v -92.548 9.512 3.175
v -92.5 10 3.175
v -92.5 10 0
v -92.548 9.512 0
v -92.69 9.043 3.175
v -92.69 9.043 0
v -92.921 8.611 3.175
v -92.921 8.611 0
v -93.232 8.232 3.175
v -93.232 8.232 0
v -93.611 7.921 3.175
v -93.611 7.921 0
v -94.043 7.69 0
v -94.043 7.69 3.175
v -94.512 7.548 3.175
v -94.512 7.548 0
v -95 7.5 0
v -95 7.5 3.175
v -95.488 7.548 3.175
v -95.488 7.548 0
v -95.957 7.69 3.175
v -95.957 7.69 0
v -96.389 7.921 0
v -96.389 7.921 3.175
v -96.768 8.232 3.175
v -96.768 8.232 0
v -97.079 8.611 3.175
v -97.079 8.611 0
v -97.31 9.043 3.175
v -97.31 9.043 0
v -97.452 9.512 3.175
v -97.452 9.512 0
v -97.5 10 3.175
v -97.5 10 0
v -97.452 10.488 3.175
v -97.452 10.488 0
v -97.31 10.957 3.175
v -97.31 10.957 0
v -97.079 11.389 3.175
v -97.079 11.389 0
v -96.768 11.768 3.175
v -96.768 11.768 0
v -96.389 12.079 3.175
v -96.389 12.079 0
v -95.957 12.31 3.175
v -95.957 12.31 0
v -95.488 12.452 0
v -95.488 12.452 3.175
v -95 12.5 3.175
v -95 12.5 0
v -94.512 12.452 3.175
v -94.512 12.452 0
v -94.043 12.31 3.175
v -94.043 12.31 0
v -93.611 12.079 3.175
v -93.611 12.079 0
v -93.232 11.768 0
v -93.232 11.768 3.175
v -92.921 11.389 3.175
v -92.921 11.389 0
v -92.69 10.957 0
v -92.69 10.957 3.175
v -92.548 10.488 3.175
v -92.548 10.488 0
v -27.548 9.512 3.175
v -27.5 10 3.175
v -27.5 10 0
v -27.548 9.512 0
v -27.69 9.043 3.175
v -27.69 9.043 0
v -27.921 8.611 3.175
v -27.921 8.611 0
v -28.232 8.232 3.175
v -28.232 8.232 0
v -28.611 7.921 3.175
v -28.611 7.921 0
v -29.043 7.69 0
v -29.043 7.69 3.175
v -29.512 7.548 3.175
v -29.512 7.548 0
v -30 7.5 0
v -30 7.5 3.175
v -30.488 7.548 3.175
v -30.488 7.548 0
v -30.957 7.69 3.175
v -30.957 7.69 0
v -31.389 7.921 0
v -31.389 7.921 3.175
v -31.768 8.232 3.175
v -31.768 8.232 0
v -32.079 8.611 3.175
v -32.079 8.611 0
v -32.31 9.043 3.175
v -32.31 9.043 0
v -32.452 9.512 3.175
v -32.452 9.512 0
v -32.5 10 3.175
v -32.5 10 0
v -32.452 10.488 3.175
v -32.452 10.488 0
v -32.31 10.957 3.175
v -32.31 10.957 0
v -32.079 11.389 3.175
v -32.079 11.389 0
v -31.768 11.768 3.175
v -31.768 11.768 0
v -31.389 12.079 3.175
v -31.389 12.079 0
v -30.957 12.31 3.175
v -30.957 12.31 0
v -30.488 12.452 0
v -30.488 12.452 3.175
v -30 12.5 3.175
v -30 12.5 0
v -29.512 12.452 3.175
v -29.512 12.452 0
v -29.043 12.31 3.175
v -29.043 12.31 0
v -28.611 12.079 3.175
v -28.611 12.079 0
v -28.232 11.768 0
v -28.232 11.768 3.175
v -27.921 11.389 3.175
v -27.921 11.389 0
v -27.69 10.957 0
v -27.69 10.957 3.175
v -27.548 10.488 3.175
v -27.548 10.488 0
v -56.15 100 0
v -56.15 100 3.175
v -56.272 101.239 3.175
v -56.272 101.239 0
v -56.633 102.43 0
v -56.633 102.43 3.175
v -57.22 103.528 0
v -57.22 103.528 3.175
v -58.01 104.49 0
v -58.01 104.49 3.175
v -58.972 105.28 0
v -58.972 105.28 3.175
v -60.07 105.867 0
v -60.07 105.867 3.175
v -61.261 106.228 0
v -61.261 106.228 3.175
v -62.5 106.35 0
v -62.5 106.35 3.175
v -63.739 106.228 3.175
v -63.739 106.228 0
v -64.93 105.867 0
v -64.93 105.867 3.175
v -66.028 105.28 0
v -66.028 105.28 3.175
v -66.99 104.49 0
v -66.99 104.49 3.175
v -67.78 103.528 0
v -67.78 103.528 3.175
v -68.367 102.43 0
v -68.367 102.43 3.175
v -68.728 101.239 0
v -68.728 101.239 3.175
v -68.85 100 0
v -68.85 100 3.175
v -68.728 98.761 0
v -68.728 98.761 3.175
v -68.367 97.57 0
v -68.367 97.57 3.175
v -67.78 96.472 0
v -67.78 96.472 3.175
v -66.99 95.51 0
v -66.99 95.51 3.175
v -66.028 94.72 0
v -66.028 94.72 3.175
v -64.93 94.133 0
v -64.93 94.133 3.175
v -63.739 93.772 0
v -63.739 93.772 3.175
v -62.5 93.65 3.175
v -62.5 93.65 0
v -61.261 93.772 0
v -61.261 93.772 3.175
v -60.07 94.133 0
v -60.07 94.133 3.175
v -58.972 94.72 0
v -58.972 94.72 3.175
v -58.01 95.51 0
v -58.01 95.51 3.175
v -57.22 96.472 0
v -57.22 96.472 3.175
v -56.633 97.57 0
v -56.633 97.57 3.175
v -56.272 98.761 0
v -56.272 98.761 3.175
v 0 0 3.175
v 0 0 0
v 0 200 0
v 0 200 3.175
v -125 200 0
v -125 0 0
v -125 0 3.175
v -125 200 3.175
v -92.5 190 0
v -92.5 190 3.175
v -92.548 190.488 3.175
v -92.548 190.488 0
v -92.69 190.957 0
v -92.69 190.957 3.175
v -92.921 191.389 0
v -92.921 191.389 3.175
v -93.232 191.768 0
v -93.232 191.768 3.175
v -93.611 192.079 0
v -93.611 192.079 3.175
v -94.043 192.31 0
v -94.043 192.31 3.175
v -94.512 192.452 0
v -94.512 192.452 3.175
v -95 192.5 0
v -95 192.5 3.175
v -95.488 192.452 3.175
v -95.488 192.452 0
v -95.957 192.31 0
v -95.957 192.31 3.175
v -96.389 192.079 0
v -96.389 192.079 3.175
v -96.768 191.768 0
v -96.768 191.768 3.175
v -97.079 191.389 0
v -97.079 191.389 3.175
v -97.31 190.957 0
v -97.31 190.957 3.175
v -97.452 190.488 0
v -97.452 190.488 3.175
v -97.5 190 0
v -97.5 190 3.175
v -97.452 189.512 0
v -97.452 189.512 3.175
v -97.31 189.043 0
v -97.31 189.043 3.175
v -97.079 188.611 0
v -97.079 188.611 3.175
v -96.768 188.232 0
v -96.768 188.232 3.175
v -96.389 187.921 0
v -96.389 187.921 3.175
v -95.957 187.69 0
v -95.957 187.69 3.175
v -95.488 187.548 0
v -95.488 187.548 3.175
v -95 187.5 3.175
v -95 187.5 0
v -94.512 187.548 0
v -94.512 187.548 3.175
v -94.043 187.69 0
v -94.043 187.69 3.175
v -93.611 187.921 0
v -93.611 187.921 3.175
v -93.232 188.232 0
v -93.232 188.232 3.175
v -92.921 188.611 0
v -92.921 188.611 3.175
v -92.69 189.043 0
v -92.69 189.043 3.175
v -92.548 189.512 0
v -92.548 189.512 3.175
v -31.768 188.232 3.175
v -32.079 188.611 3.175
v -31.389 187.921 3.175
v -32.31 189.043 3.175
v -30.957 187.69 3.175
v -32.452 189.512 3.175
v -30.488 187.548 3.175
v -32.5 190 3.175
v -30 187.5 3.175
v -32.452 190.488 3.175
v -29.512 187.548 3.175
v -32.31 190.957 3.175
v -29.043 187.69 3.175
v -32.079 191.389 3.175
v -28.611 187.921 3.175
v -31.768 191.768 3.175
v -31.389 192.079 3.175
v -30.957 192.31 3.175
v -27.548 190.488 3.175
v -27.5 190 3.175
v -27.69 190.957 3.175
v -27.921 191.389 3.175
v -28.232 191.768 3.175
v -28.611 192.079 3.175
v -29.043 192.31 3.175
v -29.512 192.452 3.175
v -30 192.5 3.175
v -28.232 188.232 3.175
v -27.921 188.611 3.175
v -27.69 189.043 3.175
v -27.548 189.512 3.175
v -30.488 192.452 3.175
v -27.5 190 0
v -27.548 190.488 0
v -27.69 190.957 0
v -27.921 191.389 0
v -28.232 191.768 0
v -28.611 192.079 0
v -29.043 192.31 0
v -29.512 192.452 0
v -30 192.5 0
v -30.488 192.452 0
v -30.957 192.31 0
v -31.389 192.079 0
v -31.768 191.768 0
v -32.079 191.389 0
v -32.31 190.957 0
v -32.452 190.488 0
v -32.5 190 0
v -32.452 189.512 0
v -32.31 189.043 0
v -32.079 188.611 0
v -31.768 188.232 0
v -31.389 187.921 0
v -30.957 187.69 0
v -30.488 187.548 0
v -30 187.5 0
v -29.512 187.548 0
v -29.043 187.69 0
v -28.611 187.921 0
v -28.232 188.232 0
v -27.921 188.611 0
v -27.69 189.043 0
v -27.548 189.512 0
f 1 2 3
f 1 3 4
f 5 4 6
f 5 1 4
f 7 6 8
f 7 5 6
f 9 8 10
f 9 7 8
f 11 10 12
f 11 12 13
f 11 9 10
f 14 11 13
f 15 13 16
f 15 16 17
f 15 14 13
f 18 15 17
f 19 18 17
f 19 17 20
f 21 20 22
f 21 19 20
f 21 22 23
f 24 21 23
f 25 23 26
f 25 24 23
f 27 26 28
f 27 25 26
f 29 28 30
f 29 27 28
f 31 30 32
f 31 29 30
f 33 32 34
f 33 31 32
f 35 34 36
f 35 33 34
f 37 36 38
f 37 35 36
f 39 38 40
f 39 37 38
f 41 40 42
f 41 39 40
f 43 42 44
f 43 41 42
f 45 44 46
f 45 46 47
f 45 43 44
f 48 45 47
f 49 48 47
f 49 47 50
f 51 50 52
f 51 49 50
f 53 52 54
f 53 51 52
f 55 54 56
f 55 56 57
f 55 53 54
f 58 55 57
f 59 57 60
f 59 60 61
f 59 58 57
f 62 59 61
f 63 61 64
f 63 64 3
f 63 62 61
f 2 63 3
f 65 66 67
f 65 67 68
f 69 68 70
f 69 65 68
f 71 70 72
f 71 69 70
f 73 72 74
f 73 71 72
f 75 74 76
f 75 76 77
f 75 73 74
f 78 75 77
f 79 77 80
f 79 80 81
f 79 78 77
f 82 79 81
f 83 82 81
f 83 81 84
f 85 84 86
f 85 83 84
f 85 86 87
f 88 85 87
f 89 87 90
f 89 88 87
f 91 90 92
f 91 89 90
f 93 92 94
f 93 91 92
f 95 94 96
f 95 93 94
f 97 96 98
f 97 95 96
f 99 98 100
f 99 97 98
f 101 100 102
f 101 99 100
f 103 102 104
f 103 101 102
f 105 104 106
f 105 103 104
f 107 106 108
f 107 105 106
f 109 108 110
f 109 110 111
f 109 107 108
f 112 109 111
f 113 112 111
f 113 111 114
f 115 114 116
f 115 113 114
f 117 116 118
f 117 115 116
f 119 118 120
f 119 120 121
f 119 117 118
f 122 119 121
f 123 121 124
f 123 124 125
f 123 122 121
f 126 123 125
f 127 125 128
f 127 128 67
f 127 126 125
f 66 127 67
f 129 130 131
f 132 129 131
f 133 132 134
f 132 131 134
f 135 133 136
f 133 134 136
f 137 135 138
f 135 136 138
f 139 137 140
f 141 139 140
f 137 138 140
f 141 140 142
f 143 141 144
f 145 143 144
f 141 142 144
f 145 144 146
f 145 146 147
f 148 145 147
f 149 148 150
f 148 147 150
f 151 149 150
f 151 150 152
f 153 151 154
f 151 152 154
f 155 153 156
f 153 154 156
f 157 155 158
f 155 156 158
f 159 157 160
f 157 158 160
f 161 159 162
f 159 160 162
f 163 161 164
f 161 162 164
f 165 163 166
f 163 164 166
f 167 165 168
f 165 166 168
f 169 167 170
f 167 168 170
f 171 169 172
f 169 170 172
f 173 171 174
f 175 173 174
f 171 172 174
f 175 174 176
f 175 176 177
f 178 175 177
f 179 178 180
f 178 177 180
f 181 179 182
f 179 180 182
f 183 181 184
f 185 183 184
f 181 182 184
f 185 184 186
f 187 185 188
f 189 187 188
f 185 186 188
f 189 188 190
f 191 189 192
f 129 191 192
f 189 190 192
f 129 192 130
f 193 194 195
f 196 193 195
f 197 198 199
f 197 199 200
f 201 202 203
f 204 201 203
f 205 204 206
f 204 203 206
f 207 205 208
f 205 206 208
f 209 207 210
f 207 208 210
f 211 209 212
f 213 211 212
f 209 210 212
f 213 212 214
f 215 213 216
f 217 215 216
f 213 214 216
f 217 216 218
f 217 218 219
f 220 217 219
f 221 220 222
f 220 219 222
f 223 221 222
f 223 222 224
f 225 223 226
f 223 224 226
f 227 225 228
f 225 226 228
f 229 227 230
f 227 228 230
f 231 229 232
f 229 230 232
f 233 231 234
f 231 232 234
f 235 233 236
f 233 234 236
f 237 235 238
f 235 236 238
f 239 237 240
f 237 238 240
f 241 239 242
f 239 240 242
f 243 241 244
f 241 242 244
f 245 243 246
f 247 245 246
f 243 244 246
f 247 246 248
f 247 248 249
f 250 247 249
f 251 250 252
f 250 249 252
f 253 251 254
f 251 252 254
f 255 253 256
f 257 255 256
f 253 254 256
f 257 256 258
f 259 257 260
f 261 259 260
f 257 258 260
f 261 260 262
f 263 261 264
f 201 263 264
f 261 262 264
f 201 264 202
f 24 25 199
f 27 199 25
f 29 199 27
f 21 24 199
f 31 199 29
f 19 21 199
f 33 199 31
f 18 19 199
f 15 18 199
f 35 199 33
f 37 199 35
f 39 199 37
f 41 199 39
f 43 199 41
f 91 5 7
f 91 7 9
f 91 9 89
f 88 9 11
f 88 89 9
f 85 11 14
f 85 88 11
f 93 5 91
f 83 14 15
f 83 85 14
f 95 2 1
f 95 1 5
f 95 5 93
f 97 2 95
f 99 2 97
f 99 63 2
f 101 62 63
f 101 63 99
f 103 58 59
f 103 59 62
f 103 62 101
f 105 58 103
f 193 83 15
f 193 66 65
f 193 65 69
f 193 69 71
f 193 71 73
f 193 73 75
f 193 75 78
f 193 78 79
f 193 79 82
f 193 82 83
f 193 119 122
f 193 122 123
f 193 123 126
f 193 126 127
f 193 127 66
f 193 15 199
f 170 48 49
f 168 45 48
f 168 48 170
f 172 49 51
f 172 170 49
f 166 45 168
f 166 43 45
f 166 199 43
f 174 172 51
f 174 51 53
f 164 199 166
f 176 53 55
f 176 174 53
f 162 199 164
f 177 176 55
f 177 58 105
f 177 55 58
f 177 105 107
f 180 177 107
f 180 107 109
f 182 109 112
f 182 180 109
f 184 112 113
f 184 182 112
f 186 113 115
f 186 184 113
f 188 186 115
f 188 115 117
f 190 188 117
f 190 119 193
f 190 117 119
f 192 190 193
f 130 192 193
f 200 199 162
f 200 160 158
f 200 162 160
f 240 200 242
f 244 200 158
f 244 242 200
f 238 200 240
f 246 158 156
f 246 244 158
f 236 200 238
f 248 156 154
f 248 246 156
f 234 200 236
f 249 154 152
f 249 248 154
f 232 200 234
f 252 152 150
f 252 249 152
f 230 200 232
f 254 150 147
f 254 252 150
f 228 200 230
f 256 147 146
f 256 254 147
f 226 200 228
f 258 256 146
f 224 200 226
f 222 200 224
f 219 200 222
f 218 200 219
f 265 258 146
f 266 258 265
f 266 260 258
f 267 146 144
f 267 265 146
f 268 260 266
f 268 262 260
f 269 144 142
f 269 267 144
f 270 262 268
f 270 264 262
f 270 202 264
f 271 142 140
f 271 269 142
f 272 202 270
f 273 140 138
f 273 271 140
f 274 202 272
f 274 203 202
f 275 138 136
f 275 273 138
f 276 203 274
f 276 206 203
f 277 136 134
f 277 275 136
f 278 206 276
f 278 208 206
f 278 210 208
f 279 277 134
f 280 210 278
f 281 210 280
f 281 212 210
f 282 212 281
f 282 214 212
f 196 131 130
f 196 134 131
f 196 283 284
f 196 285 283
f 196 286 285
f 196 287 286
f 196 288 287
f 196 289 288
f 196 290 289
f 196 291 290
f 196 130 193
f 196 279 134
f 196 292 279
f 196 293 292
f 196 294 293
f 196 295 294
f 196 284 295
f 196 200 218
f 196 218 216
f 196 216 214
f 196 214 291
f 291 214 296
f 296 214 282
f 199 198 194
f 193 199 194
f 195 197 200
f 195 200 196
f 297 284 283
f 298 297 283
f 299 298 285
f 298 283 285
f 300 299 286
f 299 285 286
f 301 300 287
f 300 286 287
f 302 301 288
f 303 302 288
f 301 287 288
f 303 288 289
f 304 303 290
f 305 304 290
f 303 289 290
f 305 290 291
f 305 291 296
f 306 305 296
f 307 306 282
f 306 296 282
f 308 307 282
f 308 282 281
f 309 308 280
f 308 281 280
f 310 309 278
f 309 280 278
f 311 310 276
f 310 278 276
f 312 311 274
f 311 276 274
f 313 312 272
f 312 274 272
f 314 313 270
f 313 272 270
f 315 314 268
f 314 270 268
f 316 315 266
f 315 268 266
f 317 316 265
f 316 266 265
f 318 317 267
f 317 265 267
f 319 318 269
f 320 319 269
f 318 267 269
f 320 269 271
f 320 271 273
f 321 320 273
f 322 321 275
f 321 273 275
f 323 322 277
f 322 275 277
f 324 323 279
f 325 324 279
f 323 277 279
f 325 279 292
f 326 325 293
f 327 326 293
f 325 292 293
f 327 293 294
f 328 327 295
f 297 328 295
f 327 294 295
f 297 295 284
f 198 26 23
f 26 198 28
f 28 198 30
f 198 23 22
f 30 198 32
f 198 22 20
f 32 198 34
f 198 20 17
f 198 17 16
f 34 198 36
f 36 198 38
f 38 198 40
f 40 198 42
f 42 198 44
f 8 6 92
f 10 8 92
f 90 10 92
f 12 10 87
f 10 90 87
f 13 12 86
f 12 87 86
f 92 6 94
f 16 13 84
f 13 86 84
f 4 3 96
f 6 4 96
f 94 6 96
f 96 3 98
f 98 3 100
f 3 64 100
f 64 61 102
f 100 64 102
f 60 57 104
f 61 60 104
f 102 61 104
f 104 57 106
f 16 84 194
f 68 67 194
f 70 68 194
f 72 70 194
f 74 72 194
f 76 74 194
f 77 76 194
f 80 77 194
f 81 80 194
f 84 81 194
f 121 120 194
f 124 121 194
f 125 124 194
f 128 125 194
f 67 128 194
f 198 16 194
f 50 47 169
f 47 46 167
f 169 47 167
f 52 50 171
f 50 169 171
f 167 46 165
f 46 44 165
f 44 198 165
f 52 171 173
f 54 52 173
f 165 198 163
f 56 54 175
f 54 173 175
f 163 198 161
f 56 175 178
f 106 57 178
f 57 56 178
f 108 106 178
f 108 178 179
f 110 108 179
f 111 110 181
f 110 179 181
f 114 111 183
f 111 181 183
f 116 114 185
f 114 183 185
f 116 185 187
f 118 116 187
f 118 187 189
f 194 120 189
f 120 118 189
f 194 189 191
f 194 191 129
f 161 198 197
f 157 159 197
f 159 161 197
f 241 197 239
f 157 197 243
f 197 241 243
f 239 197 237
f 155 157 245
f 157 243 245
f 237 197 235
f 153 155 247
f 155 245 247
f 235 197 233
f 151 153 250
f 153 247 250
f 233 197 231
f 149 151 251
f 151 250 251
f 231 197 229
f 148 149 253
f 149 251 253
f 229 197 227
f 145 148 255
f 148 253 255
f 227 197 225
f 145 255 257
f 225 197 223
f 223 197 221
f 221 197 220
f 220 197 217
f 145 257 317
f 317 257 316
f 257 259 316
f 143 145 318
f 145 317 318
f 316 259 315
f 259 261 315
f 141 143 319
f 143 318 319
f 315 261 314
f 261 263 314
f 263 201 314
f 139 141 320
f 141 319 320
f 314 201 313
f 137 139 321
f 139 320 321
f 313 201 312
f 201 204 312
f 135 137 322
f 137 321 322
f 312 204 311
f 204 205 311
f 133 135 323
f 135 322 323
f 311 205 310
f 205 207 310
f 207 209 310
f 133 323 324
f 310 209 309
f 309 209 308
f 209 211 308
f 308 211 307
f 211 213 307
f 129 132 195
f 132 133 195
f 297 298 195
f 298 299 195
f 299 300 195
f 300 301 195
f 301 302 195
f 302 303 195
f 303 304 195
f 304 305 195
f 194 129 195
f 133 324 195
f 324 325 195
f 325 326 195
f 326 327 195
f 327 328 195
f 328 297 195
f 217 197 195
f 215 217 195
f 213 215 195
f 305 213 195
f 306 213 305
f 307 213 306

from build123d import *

# Parameters (mm, degrees)
SKETCH1_W           = 125
SKETCH1_H           = 200
BOSS_EXTRUDE1_DEPTH = 3.175
SKETCH2_R           = 2.5
CUT_EXTRUDE1_DEPTH  = 3.175
SKETCH3_R           = 6.35
CUT_EXTRUDE2_DEPTH  = 3.175


with BuildPart() as part:
    # Sketch1 → Boss-Extrude1 (new body)
    with BuildSketch(Plane.XY):
        with Locations((-62.5, 100)):
            Rectangle(SKETCH1_W, SKETCH1_H)
    extrude(amount=BOSS_EXTRUDE1_DEPTH)

    # Sketch2 → Cut-Extrude1 (cut)
    with BuildSketch(Plane.XY.offset(3.175)):
        with Locations((-95, 190)):
            Circle(SKETCH2_R)
        with Locations((-30, 190)):
            Circle(SKETCH2_R)
    cut_extrude1 = extrude(amount=-CUT_EXTRUDE1_DEPTH, mode=Mode.SUBTRACT)

    # Mirror1: Cut-Extrude1 across plane
    add(cut_extrude1.mirror(Plane.ZX.offset(100)), mode=Mode.SUBTRACT)

    # Sketch3 → Cut-Extrude2 (cut)
    with BuildSketch(Plane.XY.offset(3.175)):
        with Locations((-62.5, 100)):
            Circle(SKETCH3_R)
    extrude(amount=-CUT_EXTRUDE2_DEPTH, mode=Mode.SUBTRACT)


solid = part.part
